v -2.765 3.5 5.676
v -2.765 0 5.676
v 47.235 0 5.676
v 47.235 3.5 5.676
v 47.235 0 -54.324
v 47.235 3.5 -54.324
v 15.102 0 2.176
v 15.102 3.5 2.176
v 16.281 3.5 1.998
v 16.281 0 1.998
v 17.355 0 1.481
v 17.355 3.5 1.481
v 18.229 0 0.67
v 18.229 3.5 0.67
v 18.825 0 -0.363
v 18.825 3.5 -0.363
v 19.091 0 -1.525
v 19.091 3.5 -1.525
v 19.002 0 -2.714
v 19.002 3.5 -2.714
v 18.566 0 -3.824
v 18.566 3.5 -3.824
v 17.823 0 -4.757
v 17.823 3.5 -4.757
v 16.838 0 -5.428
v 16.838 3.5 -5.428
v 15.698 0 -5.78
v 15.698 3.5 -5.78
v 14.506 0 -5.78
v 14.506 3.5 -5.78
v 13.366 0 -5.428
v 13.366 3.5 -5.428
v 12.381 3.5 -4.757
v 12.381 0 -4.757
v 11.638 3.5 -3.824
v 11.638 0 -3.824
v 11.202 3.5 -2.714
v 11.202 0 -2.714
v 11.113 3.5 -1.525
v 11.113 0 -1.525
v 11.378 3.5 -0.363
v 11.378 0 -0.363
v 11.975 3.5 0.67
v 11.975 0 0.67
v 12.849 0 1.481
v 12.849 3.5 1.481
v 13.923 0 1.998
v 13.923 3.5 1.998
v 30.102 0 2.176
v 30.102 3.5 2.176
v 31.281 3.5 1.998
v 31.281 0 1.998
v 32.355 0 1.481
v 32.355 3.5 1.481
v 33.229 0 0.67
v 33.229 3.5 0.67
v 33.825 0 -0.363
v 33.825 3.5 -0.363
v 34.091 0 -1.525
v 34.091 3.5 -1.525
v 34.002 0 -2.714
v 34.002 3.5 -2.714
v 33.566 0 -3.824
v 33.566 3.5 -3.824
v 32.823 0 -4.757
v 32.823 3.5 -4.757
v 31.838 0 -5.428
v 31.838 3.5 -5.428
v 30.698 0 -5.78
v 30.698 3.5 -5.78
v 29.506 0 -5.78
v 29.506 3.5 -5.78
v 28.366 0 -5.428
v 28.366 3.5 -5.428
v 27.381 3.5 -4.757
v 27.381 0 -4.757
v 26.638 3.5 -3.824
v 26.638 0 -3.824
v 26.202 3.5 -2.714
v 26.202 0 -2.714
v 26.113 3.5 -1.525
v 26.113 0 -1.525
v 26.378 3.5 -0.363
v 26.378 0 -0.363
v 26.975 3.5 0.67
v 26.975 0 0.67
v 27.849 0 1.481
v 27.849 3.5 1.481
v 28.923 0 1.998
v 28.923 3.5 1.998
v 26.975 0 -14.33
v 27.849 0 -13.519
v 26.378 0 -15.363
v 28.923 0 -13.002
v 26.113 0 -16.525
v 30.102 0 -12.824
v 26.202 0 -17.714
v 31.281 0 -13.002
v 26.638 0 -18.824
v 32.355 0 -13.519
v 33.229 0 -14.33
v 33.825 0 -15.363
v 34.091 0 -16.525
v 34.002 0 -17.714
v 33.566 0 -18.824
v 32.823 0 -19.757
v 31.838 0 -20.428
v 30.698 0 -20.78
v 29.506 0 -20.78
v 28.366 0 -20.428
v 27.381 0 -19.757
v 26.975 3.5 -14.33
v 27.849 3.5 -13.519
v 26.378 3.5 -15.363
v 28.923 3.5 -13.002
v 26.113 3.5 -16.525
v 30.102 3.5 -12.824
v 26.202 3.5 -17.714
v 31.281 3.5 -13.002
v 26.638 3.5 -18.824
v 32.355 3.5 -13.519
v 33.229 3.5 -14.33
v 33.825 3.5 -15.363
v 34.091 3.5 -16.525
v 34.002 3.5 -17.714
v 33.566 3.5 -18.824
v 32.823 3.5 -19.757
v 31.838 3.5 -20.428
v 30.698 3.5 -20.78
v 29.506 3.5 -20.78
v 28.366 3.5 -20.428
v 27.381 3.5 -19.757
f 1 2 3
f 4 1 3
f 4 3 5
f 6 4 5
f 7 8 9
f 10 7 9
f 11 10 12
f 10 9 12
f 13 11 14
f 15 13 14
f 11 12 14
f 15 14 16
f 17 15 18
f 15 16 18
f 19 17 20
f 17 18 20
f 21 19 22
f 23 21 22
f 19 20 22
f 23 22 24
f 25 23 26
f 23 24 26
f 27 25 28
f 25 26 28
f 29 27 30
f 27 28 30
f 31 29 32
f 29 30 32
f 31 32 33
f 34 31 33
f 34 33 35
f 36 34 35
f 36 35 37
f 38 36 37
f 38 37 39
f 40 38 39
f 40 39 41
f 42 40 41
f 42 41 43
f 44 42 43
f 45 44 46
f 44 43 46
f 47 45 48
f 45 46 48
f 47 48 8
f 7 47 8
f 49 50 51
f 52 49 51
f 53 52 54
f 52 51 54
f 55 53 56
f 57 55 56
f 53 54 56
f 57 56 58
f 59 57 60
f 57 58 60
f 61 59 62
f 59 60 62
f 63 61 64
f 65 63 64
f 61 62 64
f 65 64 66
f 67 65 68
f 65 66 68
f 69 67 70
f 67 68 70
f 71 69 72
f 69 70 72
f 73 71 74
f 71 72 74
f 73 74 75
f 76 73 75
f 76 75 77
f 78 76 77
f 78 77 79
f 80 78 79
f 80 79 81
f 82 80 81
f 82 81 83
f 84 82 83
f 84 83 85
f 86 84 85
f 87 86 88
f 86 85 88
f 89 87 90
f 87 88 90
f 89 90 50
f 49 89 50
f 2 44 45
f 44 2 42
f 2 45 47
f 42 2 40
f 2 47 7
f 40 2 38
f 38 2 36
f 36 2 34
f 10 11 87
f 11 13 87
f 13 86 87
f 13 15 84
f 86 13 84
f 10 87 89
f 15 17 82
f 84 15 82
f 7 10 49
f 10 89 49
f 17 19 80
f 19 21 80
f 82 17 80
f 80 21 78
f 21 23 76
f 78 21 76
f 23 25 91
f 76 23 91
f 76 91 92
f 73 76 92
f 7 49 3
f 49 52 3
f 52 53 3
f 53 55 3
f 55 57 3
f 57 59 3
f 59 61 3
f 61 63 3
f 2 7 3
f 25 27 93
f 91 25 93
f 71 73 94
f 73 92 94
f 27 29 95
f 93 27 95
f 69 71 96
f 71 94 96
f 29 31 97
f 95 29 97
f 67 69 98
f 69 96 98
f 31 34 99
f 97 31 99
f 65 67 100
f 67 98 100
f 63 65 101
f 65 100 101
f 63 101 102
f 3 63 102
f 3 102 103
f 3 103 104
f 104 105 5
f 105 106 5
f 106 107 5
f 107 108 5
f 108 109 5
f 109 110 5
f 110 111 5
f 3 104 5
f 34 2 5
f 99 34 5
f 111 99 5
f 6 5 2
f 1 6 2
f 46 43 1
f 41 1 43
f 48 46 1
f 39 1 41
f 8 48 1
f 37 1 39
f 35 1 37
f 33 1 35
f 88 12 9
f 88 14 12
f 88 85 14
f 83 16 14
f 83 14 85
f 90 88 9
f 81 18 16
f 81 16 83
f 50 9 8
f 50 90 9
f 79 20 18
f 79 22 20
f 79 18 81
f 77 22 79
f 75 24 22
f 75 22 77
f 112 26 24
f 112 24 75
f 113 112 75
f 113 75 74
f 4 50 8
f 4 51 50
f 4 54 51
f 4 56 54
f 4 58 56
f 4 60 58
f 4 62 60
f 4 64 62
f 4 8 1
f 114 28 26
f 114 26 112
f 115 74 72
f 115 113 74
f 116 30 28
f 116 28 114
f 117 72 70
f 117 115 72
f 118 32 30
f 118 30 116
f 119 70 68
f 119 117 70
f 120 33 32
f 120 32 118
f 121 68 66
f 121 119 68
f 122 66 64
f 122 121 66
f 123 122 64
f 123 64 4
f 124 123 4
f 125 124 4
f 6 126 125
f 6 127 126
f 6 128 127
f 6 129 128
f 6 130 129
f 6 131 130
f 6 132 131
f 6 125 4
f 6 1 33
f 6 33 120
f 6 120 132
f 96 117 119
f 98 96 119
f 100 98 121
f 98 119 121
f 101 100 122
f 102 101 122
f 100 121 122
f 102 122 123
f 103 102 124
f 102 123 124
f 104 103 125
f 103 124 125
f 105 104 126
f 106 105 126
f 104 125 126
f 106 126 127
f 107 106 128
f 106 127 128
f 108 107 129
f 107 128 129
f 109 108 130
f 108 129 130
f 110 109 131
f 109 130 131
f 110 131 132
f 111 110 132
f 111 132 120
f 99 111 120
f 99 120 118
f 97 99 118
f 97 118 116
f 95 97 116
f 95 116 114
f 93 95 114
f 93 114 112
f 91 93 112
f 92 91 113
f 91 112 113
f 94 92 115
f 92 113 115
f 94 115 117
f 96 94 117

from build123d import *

# Parameters (mm, degrees)
BOSS_EXTRUDE1_DEPTH = 3.5
SKETCH2_R           = 4
CUT_EXTRUDE1_DEPTH  = 3.5


with BuildPart() as part:
    # Sketch1 → Boss-Extrude1 (new body)
    with BuildSketch(Plane(origin=(0, 0, 0), x_dir=(1, 0, 0), z_dir=(0, 1, 0))):
        Polygon((-2.765266864, -5.675626657), (47.234733136, -5.675626657), (47.234733136, 54.324373343), align=None)
    extrude(amount=BOSS_EXTRUDE1_DEPTH)

    # Sketch2 → Cut-Extrude1 (cut)
    with BuildSketch(Plane(origin=(0, 3.5, 0), x_dir=(1, 0, 0), z_dir=(0, 1, 0))):
        with Locations(Location((30.101973136, 1.824373343, 0), (0, 0, 270))):
            Circle(SKETCH2_R)
        with Locations(Location((15.101973136, 1.824373343, 0), (0, 0, 270))):
            Circle(SKETCH2_R)
        with Locations(Location((30.101973136, 16.824373343, 0), (0, 0, 270))):
            Circle(SKETCH2_R)
    extrude(amount=-CUT_EXTRUDE1_DEPTH, mode=Mode.SUBTRACT)


solid = part.part
